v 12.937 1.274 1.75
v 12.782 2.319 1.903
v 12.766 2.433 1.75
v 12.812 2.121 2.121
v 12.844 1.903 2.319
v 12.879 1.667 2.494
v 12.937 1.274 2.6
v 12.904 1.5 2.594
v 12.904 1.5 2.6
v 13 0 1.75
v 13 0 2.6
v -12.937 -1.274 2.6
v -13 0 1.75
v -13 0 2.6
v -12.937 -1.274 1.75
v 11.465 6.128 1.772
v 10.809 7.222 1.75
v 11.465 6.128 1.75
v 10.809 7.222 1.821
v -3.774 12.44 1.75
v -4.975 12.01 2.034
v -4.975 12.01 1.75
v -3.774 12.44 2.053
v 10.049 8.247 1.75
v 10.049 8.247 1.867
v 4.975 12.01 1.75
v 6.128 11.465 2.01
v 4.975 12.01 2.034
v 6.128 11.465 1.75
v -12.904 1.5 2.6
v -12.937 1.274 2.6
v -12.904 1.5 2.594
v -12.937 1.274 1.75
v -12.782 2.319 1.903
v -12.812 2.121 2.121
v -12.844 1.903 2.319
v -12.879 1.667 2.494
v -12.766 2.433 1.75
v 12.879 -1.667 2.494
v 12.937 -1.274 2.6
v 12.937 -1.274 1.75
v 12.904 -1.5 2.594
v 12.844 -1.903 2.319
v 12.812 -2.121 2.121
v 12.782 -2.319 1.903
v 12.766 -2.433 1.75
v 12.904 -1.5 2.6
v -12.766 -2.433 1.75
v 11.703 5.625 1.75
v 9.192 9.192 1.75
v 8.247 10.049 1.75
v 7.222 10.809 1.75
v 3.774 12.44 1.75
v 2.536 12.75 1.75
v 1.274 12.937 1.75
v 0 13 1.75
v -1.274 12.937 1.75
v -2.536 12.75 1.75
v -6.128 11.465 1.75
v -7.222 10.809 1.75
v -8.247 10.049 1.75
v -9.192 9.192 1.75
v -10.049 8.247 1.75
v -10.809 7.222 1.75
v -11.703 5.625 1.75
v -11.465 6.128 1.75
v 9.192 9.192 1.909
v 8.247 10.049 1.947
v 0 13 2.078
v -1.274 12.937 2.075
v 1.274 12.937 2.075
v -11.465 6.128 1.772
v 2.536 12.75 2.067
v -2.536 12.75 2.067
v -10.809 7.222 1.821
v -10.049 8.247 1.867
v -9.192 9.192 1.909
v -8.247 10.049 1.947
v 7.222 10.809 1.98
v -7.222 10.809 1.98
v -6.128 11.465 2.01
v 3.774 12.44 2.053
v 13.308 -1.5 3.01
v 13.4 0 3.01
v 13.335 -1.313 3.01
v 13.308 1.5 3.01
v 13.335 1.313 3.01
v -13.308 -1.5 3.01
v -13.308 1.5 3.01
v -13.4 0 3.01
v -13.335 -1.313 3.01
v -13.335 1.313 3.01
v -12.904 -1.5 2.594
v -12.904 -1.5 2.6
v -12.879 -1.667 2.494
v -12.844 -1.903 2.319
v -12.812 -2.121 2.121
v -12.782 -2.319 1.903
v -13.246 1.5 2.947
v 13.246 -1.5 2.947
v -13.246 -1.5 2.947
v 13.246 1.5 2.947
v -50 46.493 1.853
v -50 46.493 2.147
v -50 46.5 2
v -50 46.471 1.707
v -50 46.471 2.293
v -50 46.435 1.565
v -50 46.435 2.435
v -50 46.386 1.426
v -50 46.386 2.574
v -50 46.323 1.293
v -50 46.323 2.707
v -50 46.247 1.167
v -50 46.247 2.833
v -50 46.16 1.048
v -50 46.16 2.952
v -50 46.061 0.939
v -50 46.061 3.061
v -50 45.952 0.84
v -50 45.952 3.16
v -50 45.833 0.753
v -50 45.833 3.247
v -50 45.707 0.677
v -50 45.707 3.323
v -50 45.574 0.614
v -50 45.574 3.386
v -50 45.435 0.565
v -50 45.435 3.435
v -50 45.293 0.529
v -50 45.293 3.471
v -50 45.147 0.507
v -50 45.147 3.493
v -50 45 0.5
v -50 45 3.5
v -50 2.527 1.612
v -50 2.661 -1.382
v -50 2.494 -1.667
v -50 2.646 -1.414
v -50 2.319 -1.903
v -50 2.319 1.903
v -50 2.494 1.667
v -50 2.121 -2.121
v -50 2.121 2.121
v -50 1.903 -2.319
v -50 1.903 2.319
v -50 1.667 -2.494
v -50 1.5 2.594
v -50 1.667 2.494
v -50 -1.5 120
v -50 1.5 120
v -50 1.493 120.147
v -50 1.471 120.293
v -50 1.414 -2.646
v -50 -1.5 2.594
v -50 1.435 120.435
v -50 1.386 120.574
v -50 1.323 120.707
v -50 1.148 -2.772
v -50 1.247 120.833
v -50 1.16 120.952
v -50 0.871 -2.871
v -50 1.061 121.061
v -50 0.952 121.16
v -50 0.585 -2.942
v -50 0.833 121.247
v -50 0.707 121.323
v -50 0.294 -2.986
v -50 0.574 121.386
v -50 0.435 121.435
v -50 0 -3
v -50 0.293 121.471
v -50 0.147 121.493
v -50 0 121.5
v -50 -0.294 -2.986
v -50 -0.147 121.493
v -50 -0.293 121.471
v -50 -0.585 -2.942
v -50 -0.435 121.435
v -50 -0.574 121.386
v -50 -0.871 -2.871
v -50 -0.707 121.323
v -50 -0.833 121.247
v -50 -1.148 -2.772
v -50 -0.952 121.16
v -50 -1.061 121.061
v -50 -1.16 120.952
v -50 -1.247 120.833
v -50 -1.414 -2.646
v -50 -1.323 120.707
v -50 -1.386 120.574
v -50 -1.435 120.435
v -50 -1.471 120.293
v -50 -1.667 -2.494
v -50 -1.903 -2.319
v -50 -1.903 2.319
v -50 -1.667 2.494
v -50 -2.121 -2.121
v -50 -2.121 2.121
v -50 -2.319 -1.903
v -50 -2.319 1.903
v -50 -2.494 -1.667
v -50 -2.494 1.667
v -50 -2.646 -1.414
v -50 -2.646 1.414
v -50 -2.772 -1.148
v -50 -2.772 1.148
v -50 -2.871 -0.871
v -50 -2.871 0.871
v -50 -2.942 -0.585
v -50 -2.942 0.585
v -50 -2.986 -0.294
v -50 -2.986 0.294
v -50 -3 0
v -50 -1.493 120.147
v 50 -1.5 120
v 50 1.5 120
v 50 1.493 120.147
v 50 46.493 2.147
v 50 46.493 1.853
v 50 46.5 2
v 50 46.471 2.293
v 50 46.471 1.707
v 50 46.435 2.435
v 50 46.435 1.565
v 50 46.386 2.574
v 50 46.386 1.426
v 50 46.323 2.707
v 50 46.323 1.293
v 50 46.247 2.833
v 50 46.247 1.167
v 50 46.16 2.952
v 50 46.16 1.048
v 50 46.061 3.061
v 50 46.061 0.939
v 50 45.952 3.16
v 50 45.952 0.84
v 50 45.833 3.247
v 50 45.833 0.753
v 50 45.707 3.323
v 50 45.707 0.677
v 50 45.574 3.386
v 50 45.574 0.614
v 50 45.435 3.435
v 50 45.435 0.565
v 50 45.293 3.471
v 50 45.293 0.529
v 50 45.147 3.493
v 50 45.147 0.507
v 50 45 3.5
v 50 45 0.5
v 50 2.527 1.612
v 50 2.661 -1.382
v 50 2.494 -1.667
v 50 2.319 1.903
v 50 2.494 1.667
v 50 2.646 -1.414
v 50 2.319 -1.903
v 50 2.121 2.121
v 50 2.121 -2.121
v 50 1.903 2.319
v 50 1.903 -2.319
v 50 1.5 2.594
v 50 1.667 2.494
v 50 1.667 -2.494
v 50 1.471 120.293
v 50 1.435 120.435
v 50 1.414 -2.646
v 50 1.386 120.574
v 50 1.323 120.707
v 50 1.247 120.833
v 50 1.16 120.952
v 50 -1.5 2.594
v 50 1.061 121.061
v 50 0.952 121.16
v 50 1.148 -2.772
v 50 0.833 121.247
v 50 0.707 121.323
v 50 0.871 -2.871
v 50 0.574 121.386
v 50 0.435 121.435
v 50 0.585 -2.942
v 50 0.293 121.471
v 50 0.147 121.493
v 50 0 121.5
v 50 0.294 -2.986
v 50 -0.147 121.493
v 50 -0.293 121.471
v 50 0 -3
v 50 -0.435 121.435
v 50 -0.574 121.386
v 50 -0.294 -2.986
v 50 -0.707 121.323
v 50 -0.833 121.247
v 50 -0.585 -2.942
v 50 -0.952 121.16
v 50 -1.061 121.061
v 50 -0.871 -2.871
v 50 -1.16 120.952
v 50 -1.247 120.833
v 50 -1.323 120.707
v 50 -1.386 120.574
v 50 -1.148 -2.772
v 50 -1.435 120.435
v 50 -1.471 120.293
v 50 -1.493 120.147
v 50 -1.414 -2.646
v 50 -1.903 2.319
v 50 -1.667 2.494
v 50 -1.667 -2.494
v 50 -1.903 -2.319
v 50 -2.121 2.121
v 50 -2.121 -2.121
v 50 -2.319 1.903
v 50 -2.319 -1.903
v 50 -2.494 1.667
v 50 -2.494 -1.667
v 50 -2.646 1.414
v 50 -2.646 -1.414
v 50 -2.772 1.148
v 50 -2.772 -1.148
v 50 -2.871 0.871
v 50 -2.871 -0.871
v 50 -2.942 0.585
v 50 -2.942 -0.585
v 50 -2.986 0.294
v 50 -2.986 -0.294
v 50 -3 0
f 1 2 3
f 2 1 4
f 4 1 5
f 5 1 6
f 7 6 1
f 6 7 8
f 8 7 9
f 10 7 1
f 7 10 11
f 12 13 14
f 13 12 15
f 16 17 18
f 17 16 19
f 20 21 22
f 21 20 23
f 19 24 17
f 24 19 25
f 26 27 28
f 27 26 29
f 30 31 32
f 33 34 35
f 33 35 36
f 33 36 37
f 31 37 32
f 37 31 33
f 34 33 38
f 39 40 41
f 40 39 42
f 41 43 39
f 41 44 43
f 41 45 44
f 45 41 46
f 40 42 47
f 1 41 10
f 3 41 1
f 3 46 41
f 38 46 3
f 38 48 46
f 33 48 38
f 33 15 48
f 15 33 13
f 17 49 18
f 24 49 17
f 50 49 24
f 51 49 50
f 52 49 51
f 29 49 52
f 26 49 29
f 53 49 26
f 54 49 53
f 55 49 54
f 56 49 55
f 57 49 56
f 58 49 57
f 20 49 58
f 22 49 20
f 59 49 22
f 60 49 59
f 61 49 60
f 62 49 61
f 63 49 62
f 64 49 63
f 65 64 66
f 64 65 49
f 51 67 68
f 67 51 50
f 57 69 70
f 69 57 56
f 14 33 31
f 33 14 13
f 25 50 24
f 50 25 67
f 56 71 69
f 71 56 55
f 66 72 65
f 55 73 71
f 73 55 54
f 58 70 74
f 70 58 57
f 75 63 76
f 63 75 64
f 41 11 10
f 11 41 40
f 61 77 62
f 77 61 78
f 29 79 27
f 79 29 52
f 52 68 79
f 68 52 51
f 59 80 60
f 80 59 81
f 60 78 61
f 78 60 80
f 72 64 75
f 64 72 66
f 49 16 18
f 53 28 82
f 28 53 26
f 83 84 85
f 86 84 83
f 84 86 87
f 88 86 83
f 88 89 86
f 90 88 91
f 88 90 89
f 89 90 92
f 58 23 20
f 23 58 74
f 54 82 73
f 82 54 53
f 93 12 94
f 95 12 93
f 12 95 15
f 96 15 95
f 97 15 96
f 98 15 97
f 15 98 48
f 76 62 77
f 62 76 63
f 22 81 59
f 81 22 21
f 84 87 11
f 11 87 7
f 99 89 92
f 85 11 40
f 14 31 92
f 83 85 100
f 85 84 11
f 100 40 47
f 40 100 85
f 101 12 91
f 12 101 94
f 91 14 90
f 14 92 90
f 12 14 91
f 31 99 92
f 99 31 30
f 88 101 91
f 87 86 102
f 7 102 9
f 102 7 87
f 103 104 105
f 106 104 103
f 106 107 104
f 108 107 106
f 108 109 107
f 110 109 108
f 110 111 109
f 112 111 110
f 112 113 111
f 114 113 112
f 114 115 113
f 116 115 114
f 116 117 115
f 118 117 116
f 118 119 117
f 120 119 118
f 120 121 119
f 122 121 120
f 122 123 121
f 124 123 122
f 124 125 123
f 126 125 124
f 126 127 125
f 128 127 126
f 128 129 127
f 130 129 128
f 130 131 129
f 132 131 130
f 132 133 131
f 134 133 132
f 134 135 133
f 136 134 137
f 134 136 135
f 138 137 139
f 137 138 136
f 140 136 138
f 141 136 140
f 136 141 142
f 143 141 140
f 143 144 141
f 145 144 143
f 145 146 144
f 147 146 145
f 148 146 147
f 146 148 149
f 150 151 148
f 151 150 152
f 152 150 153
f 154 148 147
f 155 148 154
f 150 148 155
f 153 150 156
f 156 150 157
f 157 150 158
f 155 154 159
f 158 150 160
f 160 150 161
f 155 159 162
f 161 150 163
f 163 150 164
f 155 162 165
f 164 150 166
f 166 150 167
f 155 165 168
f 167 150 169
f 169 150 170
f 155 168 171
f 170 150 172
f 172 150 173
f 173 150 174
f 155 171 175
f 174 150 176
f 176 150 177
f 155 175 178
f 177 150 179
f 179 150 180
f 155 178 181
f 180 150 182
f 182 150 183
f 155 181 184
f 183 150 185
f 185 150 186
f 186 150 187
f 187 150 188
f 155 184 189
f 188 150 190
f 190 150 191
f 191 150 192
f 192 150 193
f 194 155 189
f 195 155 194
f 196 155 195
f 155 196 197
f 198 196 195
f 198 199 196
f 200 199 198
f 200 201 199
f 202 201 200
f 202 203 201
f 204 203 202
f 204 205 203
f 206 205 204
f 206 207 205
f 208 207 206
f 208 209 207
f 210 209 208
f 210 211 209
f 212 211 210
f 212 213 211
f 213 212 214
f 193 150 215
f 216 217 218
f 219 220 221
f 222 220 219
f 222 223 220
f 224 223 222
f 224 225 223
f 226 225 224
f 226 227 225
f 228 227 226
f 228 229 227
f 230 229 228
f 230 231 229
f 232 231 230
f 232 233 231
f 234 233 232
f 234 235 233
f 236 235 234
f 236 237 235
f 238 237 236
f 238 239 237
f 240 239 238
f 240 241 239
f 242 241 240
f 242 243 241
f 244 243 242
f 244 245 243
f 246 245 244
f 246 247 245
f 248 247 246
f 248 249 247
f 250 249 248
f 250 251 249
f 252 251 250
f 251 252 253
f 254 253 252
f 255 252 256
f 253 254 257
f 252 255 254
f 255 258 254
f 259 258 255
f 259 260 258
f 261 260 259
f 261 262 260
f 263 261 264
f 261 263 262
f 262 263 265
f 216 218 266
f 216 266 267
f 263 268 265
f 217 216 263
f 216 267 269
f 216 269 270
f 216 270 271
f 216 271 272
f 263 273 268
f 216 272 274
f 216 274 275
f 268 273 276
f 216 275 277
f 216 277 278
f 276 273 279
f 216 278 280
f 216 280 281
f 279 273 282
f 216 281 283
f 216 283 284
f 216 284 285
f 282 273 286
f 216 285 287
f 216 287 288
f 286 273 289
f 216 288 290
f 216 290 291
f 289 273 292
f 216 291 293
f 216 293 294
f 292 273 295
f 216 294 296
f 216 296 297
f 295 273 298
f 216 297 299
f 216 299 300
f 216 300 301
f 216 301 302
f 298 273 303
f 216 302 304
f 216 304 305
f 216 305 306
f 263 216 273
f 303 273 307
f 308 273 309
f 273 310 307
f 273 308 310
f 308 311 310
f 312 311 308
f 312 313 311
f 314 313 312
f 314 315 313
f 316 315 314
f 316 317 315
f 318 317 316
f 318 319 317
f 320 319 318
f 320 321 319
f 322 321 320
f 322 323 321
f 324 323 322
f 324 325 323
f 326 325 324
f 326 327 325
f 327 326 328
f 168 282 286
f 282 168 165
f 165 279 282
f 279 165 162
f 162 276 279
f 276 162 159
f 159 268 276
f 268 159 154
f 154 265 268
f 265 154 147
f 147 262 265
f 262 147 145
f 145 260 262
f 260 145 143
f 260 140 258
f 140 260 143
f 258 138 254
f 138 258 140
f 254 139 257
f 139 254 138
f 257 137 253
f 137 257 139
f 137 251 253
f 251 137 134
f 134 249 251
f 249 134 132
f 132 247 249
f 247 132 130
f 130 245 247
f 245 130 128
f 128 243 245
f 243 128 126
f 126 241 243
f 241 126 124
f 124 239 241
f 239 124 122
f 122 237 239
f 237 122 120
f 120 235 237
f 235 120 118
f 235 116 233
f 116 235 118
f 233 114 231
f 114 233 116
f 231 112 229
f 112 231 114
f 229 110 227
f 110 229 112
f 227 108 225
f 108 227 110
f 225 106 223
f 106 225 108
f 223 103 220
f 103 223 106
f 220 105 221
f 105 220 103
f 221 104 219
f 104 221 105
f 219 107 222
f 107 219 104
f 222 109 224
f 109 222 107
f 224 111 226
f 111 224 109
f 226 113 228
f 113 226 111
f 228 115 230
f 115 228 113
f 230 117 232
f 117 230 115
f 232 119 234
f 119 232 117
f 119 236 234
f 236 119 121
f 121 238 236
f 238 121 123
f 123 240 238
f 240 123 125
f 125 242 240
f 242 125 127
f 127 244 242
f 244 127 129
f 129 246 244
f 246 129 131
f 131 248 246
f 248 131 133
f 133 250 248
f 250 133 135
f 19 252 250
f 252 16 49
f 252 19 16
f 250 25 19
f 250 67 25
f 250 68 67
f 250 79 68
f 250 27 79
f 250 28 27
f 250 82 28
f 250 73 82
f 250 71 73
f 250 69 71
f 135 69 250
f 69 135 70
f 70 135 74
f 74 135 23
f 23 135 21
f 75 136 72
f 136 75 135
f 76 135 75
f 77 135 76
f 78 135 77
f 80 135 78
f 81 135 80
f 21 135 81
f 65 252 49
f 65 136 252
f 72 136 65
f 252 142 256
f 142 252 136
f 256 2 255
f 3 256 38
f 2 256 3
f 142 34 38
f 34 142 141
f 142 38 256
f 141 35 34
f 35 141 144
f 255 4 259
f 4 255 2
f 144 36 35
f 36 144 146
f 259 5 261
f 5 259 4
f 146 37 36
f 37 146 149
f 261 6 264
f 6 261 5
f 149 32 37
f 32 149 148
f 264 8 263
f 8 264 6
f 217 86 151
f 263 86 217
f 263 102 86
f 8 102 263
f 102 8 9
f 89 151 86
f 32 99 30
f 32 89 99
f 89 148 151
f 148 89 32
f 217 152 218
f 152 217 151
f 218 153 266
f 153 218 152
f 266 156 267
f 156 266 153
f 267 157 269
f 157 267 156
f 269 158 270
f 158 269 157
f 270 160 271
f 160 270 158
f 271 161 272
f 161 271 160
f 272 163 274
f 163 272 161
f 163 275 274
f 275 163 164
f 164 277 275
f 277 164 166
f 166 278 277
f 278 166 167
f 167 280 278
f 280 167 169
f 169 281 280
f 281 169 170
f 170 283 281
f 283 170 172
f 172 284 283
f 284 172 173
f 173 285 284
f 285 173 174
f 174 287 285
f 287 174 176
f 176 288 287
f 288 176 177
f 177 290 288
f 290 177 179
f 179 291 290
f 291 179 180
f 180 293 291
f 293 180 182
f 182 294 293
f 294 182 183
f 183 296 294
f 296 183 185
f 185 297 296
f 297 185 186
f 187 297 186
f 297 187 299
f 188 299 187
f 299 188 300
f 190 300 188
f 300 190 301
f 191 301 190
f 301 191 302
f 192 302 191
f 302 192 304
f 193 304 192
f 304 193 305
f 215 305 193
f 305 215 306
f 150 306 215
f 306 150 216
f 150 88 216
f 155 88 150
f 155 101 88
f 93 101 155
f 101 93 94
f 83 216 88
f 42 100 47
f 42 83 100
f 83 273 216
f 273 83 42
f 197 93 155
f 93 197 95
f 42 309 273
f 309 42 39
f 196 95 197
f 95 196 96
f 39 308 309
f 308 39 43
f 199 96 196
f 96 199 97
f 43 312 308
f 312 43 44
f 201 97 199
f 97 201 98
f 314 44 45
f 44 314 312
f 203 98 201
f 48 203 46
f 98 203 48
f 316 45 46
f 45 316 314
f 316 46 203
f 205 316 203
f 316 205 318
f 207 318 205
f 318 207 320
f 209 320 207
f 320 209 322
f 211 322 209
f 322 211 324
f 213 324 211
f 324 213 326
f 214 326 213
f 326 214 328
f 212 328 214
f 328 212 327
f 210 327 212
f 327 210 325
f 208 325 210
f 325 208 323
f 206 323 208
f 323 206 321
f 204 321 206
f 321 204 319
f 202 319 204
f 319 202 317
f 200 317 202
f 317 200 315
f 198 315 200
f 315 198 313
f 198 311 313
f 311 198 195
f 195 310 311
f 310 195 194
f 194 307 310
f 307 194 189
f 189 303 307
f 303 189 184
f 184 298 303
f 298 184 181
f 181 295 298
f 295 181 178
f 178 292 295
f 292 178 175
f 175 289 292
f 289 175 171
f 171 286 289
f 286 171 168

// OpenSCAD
/*
 * NFC Pedestal Sign — Single-Piece L-Shape
 *
 * One solid extrusion: sign panel + foot in one piece.
 * Print face-down (sign face = build plate). No supports needed.
 *
 * Adjustable: foot depth, foot height, foot angle, fillet, NFC, logo, text.
 */

/* [Sign Panel] */
sign_color    = "#FFFFFF"; // color
sign_width    = 100; // [40:1:250]
sign_height   = 120; // [40:1:300]
sign_thickness = 3;  // [2:0.5:10]
corner_radius  = 6;  // [0:0.5:30]

/* [Foot] */
// Depth the foot extends forward from the sign face (mm)
foot_depth  = 45; // [10:1:180]

// Height of the foot slab (mm)
foot_height = 5;  // [1:0.5:40]

// Angle of foot relative to sign face — 90 = flat L, < 90 tilts sign back (degrees)
foot_angle  = 90; // [45:1:120]

// Fillet radius at the outside lower corner of the L (mm)
fillet_radius = 6; // [0:0.5:20]

/* [NFC Tag] */
enable_nfc   = true;
nfc_diameter = 26;   // [20:0.5:35]
nfc_depth    = 1.25; // [0.5:0.1:3]
nfc_offset_x = 0;    // [-60:1:60]
nfc_offset_y = 0;    // [-60:1:80]

/* [Logo] */
logo_type      = "svg";          // [svg, png, stl, none]
logo_svg_file  = "default.svg";  // file
logo_png_file  = "default.png";  // file
logo_stl_file  = "default.stl";  // file
logo_color     = "#00FF00";      // color
logo_width     = 60;  // [5:1:200]
logo_height    = 60;  // [5:1:200]
logo_thickness = 0.6; // [0.2:0.1:5]
logo_flush     = true;
logo_mode      = "emboss"; // [emboss, deboss]
logo_offset_x  = 0;  // [-100:1:100]
logo_offset_y  = 10; // [-100:1:100]
logo_rotation  = 0;  // [0:5:355]

/* [Text] */
enable_text    = false;
text_string    = "SCAN ME";
text_font      = "Liberation Sans";
text_style     = "Bold"; // [Regular, Bold, Italic, Bold Italic]
text_size      = 8;      // [3:0.5:30]
text_thickness = 0.6;    // [0.2:0.1:3]
text_color     = "#333333"; // color
text_offset_x  = 0;   // [-100:1:100]
text_offset_y  = -40; // [-100:1:100]
text_mode      = "emboss"; // [emboss, deboss]

/* [Render] */
// print_ready = face-down for slicing | display_view = upright preview
render_mode = "print_ready"; // [print_ready, display_view]

/* [Advanced] */
$fn = 64;

// ── L-profile in the YZ plane ────────────────────────────────
// In print orientation:  Z = up,  Y = depth axis
//   sign face at Z = 0
//   sign back  at Z = sign_thickness
//   foot runs from sign bottom in the +Y direction
//
// foot_angle: angle between foot surface and sign face plane.
//   90° → classic right-angle L
//  <90° → foot tilts so the sign leans back when stood upright

function _foot_dy() = max(0.01, foot_depth) * sin(foot_angle);   // Y extent of foot
function _foot_dz() = max(0.01, foot_depth) * cos(foot_angle);   // Z rise/drop of foot tip

module _L_profile_2d() {
    // Build a constant-thickness "folded sheet" profile from a centerline:
    // vertical sign segment + angled foot segment, with a smoothed outer fold.
    dy = _foot_dy();
    dz = _foot_dz();
    t  = sign_thickness;
    r  = max(0.01, t/2);

    p_top  = [0, sign_height];
    p_fold = [0, 0];
    // foot_height acts as the raised end height of the folded foot segment
    p_tip  = [dy, dz + (foot_height - sign_thickness)];

    // Rounded folded sheet (constant thickness) from hulled centerline circles.
    // This removes the odd "attachment lump" by using one continuous strip body.
    union() {
        hull() {
            translate(p_top)  circle(r=r);
            translate(p_fold) circle(r=r);
        }
        hull() {
            translate(p_fold) circle(r=r);
            translate(p_tip)  circle(r=r);
        }

        // Optional outside fold reinforcement / smoothing at the bend.
        if (fillet_radius > 0.001)
            translate(p_fold) circle(r=min(fillet_radius, r*2));
    }
}

// ── Extrude L-profile to full sign width ─────────────────────
module _L_solid() {
    rotate([90, 0, 90])
        linear_extrude(height = sign_width, center = true)
            _L_profile_2d();
}

// ── NFC recess (back face of sign = Z=sign_thickness top) ───
module _nfc_cut() {
    if (enable_nfc) {
        translate([nfc_offset_x, nfc_offset_y, sign_thickness - nfc_depth])
            cylinder(d = nfc_diameter, h = nfc_depth + 0.01);
        translate([nfc_offset_x, nfc_offset_y, sign_thickness - 0.4])
            cylinder(d1 = nfc_diameter, d2 = nfc_diameter + 0.8, h = 0.41);
    }
}

// ── Logo helpers ─────────────────────────────────────────────
function _logo_ok() =
    (logo_type == "svg" && logo_svg_file != "default.svg") ||
    (logo_type == "png" && logo_png_file != "default.png") ||
    (logo_type == "stl" && logo_stl_file != "default.stl");

module _logo_geo() {
    if (logo_type == "svg" && logo_svg_file != "default.svg")
        resize([logo_width, logo_height, logo_thickness], auto=true)
            linear_extrude(height=logo_thickness, center=true)
                import(file=logo_svg_file, center=true);
    else if (logo_type == "png" && logo_png_file != "default.png")
        resize([logo_width, logo_height, logo_thickness], auto=true)
            surface(file=logo_png_file, center=true);
    else if (logo_type == "stl" && logo_stl_file != "default.stl")
        resize([logo_width, logo_height, logo_thickness], auto=true)
            import(file=logo_stl_file, center=true);
}

module _logo_cut() {
    if (_logo_ok() && (logo_mode == "deboss" || logo_flush)) {
        d = logo_thickness + 0.02;
        translate([logo_offset_x, logo_offset_y, -d/2])
            rotate([0,0,logo_rotation]) _logo_geo();
    }
}

module _logo_add() {
    if (_logo_ok() && logo_mode == "emboss") {
        z = logo_flush ? logo_thickness/2 : -logo_thickness/2;
        color(logo_color)
            translate([logo_offset_x, logo_offset_y, z])
                rotate([0,0,logo_rotation]) _logo_geo();
    }
}

// ── Text helpers ──────────────────────────────────────────────
module _text_cut() {
    if (enable_text && text_mode == "deboss")
        translate([text_offset_x, text_offset_y, -text_thickness/2])
            linear_extrude(height=text_thickness, center=true)
                text(text_string, size=text_size, halign="center", valign="center",
                     font=str(text_font,":style=",text_style));
}

module _text_add() {
    if (enable_text && text_mode == "emboss") {
        z = logo_flush ? text_thickness/2 : -text_thickness/2;
        color(text_color)
            translate([text_offset_x, text_offset_y, z])
                linear_extrude(height=text_thickness, center=true)
                    text(text_string, size=text_size, halign="center", valign="center",
                         font=str(text_font,":style=",text_style));
    }
}

// ── Full assembly ─────────────────────────────────────────────
// Single-piece L-shaped body: sign plate + foot are one continuous solid
module pedestal() {
    color(sign_color)
        difference() {
            _L_solid();
            _nfc_cut();
            _logo_cut();
            _text_cut();
        }
    _logo_add();
    _text_add();
}

// ── Render ────────────────────────────────────────────────────
if (render_mode == "print_ready") {
    pedestal();
} else {
    // Rotate upright: pivot about the bottom-front edge
    translate([0, -sign_height/2, 0])
        rotate([-90, 0, 0])
            translate([0, sign_height/2, 0])
                pedestal();
}
